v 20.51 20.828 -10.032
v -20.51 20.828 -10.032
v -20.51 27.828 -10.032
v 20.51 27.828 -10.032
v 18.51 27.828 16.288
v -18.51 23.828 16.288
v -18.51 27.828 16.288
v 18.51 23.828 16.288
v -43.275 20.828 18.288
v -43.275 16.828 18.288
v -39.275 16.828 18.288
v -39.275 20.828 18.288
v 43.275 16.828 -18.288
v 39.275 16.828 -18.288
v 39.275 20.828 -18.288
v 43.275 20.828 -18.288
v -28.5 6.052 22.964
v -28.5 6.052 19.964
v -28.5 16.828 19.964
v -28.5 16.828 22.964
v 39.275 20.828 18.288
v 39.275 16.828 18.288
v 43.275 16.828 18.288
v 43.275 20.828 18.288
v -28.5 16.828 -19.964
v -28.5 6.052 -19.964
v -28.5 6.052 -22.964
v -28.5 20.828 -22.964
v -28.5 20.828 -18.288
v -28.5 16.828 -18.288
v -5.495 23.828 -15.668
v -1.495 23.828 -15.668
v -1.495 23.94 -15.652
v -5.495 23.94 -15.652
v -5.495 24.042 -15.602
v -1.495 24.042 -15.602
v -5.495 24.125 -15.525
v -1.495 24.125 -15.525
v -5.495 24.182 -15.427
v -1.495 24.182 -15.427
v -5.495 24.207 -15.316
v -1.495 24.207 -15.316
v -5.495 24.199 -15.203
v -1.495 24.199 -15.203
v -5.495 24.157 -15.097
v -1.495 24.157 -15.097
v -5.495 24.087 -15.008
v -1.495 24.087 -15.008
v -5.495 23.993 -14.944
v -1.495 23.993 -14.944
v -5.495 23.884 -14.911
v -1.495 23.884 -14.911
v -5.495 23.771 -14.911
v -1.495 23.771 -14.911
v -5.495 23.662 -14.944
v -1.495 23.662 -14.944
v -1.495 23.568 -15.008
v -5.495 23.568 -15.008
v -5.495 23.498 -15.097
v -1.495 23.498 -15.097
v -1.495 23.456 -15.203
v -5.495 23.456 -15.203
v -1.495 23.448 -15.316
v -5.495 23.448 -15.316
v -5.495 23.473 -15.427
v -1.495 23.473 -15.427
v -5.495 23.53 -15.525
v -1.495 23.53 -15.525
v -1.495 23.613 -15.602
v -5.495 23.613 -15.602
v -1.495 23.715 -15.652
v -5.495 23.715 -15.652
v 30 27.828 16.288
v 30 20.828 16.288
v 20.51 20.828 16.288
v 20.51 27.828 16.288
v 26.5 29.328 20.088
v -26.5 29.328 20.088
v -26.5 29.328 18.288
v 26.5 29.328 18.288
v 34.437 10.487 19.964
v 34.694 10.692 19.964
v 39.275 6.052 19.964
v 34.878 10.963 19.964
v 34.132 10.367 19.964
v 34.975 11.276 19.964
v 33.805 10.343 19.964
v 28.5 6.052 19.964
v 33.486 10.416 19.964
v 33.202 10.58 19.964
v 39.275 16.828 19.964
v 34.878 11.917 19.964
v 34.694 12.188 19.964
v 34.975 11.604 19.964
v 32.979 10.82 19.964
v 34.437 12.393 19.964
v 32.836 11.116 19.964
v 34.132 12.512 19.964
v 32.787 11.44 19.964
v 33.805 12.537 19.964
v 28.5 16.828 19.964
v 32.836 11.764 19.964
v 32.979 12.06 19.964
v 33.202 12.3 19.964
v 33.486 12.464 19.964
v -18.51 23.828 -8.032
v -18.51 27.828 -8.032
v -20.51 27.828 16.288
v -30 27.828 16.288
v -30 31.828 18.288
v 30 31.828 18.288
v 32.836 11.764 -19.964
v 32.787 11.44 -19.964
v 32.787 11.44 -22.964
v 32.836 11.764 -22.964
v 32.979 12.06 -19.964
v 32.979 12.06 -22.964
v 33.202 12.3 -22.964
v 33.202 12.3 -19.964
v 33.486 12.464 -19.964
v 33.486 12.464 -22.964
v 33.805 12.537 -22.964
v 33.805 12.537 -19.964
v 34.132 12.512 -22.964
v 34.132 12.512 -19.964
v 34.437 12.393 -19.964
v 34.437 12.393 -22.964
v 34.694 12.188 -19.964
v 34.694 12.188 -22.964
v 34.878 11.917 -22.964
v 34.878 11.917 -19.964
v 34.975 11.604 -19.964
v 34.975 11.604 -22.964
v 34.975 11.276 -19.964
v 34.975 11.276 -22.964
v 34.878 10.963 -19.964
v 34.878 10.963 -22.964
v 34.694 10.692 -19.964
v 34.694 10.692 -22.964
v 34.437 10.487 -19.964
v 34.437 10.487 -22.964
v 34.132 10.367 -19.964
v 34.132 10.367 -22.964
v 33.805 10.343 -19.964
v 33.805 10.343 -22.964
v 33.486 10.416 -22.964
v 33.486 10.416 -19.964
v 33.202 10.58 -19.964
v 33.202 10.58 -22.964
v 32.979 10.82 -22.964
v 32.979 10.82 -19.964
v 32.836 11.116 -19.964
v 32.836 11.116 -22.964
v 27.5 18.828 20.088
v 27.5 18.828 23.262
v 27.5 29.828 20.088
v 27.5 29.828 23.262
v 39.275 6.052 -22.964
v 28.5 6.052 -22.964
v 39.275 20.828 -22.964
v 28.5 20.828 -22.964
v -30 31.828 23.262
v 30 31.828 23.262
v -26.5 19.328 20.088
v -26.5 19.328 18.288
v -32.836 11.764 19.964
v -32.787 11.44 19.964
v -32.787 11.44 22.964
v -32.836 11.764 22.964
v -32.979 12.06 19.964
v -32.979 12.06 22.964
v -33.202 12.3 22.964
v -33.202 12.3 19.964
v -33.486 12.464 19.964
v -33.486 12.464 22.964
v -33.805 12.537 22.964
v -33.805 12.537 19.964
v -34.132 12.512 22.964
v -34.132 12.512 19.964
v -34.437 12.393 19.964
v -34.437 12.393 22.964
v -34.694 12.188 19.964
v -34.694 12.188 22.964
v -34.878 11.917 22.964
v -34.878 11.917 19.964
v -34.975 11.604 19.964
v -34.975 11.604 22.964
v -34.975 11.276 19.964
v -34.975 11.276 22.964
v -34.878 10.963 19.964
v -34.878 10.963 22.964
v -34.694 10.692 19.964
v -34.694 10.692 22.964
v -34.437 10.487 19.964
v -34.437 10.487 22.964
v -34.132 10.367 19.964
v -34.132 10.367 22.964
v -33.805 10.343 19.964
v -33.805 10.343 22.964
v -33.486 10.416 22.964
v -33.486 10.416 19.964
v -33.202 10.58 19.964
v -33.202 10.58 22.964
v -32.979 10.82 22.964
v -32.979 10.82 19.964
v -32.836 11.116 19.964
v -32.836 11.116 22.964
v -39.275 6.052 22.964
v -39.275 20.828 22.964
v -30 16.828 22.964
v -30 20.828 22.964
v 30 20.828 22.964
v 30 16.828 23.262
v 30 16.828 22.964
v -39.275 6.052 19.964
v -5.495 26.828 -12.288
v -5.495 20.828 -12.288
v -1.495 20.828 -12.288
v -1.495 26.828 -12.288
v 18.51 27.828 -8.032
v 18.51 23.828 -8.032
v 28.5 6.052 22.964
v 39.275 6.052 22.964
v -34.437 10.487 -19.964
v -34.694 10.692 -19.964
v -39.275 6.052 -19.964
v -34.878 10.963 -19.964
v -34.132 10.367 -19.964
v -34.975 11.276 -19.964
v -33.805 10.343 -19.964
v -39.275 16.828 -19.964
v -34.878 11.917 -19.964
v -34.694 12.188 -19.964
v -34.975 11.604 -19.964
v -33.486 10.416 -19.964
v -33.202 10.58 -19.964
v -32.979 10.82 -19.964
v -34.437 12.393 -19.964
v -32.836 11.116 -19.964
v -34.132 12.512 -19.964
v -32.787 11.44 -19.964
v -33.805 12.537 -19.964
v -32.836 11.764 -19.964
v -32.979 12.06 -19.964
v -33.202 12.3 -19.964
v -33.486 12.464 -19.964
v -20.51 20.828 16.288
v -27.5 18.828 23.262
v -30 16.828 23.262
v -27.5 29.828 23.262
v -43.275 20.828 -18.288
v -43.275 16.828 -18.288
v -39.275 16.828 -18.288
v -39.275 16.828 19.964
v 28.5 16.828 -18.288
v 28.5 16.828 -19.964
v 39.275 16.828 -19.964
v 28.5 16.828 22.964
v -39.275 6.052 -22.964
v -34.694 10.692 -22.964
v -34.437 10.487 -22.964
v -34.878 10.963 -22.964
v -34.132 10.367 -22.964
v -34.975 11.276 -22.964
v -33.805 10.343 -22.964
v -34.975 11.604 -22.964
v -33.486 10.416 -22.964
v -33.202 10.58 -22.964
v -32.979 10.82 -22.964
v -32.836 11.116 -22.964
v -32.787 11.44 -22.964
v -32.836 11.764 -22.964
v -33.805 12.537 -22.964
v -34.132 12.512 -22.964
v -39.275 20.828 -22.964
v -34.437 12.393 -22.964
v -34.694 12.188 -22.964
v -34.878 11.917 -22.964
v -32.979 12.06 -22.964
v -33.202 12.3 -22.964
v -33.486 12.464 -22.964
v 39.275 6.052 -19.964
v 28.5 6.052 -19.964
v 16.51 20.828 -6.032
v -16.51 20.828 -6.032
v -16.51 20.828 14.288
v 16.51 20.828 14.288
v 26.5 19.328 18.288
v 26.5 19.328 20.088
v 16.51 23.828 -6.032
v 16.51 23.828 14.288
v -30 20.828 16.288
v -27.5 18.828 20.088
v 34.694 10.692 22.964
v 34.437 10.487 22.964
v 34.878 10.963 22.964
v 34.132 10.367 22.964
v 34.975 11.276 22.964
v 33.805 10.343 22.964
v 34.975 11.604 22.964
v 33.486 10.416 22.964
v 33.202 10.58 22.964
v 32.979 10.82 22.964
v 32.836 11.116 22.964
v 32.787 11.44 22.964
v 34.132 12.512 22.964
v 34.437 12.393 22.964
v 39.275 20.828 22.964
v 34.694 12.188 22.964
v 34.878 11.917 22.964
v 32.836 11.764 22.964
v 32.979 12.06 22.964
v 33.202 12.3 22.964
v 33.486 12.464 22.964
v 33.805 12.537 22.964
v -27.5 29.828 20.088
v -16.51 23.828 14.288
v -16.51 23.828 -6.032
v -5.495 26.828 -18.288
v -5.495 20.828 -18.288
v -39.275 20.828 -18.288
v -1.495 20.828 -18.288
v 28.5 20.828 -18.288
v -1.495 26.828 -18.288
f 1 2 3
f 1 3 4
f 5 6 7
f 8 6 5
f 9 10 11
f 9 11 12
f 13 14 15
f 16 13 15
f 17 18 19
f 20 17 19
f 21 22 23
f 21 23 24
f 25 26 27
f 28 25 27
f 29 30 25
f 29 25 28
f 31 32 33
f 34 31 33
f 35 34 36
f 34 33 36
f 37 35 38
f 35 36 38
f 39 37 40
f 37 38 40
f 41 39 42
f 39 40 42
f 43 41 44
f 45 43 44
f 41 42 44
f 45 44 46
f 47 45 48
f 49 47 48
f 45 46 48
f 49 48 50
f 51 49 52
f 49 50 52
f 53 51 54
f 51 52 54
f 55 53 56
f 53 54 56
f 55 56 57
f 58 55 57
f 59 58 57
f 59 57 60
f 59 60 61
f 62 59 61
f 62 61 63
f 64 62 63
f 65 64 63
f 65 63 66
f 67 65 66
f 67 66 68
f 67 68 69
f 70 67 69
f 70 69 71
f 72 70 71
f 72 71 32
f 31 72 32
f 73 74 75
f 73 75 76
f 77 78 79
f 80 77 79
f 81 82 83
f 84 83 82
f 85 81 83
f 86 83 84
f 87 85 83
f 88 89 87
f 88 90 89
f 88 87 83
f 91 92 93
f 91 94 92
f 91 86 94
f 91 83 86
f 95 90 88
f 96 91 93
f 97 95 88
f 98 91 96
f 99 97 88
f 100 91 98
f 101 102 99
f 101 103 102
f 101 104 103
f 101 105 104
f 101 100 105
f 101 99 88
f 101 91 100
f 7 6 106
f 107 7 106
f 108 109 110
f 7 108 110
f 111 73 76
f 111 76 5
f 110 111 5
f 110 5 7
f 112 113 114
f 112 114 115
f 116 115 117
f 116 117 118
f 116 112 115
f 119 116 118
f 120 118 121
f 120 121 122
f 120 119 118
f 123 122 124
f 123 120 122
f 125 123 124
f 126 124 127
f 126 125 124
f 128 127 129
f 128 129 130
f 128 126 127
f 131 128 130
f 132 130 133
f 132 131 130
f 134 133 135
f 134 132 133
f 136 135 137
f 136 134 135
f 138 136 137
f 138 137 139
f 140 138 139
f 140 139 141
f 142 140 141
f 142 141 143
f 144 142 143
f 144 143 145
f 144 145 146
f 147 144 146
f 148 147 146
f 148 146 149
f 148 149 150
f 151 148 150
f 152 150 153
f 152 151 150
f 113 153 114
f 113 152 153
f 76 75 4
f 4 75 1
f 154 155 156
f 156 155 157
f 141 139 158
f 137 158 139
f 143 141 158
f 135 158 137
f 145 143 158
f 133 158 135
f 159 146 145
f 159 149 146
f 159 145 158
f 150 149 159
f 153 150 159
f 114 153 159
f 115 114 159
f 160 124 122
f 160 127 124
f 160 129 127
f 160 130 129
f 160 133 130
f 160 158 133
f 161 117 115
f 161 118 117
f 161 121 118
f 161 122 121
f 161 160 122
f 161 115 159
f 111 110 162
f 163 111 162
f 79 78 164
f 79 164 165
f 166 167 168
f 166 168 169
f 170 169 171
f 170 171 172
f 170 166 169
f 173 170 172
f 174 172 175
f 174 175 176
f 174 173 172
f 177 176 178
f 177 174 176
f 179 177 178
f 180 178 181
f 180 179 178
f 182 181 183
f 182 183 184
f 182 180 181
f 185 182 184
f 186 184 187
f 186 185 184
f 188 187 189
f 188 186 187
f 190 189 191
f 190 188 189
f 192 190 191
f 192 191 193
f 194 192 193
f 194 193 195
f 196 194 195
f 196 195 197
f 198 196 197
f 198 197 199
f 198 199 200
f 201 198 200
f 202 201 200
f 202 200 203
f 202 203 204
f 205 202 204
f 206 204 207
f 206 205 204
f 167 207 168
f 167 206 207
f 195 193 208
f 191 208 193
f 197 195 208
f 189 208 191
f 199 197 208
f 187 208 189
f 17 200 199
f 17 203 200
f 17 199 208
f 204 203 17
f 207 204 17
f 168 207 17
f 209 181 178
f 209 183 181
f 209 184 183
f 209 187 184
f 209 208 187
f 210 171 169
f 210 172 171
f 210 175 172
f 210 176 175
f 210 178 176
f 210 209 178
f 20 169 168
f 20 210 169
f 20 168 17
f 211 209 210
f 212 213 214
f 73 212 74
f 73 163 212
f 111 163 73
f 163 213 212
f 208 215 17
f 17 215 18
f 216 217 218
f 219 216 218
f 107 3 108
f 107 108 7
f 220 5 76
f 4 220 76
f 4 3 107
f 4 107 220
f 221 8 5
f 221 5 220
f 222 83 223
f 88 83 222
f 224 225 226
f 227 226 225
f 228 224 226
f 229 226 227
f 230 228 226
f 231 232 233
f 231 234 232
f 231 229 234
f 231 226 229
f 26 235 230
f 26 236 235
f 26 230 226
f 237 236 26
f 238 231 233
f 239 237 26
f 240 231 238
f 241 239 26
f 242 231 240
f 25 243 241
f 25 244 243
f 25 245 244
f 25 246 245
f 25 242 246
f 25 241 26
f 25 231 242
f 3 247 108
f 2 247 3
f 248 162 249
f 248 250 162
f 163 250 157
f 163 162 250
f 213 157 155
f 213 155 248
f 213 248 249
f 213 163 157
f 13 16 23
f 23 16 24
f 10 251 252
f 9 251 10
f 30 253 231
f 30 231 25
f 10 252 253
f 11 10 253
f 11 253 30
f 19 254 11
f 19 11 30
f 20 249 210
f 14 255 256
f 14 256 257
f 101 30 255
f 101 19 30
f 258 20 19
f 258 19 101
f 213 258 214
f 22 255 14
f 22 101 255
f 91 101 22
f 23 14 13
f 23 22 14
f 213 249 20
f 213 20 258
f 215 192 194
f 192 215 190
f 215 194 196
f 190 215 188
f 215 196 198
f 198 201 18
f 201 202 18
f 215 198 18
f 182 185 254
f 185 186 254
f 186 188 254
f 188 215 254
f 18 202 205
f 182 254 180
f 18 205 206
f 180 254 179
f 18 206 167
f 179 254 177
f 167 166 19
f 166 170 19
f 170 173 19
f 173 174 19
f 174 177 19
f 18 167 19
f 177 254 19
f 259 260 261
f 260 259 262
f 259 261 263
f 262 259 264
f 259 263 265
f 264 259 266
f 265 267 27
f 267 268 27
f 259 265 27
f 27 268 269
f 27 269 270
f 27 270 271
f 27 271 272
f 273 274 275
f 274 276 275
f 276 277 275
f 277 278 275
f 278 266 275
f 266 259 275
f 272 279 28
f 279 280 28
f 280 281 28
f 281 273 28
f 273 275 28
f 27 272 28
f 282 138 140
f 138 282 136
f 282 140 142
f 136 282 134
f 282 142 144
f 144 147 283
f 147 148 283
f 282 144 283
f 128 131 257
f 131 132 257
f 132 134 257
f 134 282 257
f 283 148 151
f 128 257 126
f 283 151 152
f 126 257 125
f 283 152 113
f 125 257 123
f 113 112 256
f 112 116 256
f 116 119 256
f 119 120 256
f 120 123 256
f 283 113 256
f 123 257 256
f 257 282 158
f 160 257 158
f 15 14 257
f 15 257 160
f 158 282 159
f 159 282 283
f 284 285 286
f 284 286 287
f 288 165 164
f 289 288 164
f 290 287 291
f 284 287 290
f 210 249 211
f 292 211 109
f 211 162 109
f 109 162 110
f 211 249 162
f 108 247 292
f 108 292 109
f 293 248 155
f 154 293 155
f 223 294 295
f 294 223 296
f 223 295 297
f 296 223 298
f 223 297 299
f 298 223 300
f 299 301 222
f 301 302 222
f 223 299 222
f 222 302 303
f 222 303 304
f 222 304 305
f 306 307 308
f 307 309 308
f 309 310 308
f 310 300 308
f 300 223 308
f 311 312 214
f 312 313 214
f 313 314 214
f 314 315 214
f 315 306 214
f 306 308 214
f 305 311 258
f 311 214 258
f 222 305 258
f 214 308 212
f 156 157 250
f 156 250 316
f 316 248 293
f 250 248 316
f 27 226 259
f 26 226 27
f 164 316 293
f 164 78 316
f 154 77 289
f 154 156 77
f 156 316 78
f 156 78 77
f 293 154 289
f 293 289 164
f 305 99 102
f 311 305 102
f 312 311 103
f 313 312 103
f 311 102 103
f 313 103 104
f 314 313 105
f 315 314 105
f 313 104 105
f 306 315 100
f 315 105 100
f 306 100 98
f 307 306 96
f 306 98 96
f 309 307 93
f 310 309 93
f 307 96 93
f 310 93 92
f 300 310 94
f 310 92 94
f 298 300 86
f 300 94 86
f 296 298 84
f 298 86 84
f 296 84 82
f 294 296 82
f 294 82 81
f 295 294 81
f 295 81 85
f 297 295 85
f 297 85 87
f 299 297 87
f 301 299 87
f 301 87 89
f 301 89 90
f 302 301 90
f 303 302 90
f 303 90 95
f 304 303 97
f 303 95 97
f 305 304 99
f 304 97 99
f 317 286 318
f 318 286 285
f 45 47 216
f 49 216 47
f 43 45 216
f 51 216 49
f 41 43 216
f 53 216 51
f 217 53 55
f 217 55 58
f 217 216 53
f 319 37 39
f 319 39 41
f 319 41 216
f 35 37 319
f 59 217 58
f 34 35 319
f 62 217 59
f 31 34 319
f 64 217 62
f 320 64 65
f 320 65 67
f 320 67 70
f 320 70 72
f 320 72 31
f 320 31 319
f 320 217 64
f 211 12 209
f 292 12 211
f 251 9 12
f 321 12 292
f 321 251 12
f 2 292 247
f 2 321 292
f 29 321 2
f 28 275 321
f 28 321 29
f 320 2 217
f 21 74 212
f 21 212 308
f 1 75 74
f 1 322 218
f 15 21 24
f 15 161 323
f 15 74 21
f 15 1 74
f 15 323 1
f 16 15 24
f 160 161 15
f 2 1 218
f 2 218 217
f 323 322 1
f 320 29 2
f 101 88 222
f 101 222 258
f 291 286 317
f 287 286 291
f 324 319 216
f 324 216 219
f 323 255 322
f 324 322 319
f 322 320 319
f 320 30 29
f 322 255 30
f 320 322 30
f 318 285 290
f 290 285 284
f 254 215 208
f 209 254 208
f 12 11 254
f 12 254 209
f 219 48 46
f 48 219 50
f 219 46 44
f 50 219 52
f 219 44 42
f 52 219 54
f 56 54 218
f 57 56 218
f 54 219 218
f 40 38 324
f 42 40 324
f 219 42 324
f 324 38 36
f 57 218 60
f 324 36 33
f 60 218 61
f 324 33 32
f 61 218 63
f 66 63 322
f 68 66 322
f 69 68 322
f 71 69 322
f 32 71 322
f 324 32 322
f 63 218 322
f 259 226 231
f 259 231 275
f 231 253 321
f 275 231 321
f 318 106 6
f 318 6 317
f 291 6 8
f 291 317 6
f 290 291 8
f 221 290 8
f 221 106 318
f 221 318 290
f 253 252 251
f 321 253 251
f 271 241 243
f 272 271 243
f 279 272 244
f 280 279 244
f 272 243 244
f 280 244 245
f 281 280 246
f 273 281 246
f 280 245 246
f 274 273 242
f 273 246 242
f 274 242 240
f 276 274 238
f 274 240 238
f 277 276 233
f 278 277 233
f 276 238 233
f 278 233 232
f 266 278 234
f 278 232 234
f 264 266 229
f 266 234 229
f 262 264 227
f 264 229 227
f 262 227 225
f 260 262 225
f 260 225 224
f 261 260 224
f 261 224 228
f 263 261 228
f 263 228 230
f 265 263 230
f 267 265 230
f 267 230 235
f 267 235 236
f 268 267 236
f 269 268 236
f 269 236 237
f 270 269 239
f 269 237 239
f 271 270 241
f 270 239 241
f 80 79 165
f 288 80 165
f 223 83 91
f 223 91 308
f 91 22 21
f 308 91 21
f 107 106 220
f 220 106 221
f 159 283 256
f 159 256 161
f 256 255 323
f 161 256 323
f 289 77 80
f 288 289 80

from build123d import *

# Parameters (mm, degrees)
SKETCH1_W               = 36.575
SKETCH1_H               = 41.655
SKETCH1_W_2             = 28.575
SKETCH1_H_2             = 33.655
BOSS_EXTRUDE1_DEPTH     = 41.275
SKETCH2_W               = 36.575
SKETCH2_H               = 41.655
BOSS_EXTRUDE2_DEPTH     = 2
SKETCH4_W               = 86.55
SKETCH4_H               = 36.575
CUT_EXTRUDE2_DEPTH      = 37.655
SKETCH5_W               = 10.7752
SKETCH5_H               = 4
BOSS_EXTRUDE3_DEPTH     = 1.6764
SKETCH6_W               = 10.7752
SKETCH6_H               = 14.7752
SKETCH6_R               = 1.1
BOSS_EXTRUDE4_DEPTH     = 3
MIRROR3_COPY_1_SKETCH_W = 10.7752
MIRROR3_COPY_1_SKETCH_H = 4
MIRROR3_COPY_1_DEPTH    = 1.6764
MIRROR3_COPY_2_SKETCH_W = 10.7752
MIRROR3_COPY_2_SKETCH_H = 14.7752
MIRROR3_COPY_2_SKETCH_R = 1.1
MIRROR3_COPY_2_DEPTH    = 3
SKETCH7_W               = 4
SKETCH7_H               = 6
BOSS_EXTRUDE5_DEPTH     = 6
SKETCH8_R               = 0.381
CUT_EXTRUDE3_DEPTH      = 58.021122047
SKETCH9_W               = 41.02
SKETCH9_H               = 28.32
SKETCH9_W_2             = 33.02
SKETCH9_H_2             = 20.32
BOSS_EXTRUDE6_DEPTH     = 3
SKETCH10_W              = 41.02
SKETCH10_H              = 28.32
SKETCH10_W_2            = 37.02
SKETCH10_H_2            = 24.32
BOSS_EXTRUDE7_DEPTH     = 4
BOSS_EXTRUDE8_DEPTH     = 30
BOSS_EXTRUDE9_DEPTH     = 3.5
SKETCH13_W              = 55
SKETCH13_H              = 11
CUT_EXTRUDE4_DEPTH      = 3.175


with BuildPart() as part:
    # Sketch1 → Boss-Extrude1 (new, symmetric)
    with BuildSketch(Plane(origin=(0, 0, 0), x_dir=(0, 0, -1), z_dir=(1, 0, 0))):
        Rectangle(SKETCH1_W, SKETCH1_H)
        Rectangle(SKETCH1_W_2, SKETCH1_H_2, mode=Mode.SUBTRACT)
    extrude(amount=BOSS_EXTRUDE1_DEPTH, both=True)

    # Sketch2 → Boss-Extrude2 (add)
    with BuildSketch(Plane.ZY.offset(41.275)):
        Rectangle(SKETCH2_W, SKETCH2_H)
    boss_extrude2 = extrude(amount=BOSS_EXTRUDE2_DEPTH)

    # Mirror1: Boss-Extrude2 across plane
    add(boss_extrude2.mirror(Plane(origin=(0, 0, 0), x_dir=(0, 0, 1), z_dir=(1, 0, 0))))

    # Sketch4 → Cut-Extrude2 (cut)
    with BuildSketch(Plane.XZ.offset(20.8275)):
        Rectangle(SKETCH4_W, SKETCH4_H)
    extrude(amount=-CUT_EXTRUDE2_DEPTH, mode=Mode.SUBTRACT)

    # Sketch5 → Boss-Extrude3 (add)
    with BuildSketch(Plane(origin=(0, 0, -18.2875), x_dir=(-1, 0, 0), z_dir=(0, 0, -1))):
        with Locations((-33.8874, 18.8275)):
            Rectangle(SKETCH5_W, SKETCH5_H)
    boss_extrude3 = extrude(amount=BOSS_EXTRUDE3_DEPTH)

    # Sketch6 → Boss-Extrude4 (add)
    with BuildSketch(Plane(origin=(0, 0, -19.9639), x_dir=(-1, 0, 0), z_dir=(0, 0, -1))):
        with Locations((-33.8874, 13.4399)):
            Rectangle(SKETCH6_W, SKETCH6_H)
        with Locations((-33.8874, 11.4399)):
            Circle(SKETCH6_R, mode=Mode.SUBTRACT)
    boss_extrude4 = extrude(amount=BOSS_EXTRUDE4_DEPTH)

    # Mirror2: Boss-Extrude3, Boss-Extrude4 across plane
    add(boss_extrude3.mirror(Plane(origin=(0, 0, 0), x_dir=(0, 0, 1), z_dir=(1, 0, 0))))
    add(boss_extrude4.mirror(Plane(origin=(0, 0, 0), x_dir=(0, 0, 1), z_dir=(1, 0, 0))))

    # Mirror3: Boss-Extrude3, Boss-Extrude4 across plane
    add(boss_extrude3.mirror(Plane.XY))
    add(boss_extrude4.mirror(Plane.XY))

    # Mirror3 copy 1 sketch → Mirror3 copy 1 (add)
    with BuildSketch(Plane.XY.offset(18.2875)):
        with Locations((-33.8874, 18.8275)):
            Rectangle(MIRROR3_COPY_1_SKETCH_W, MIRROR3_COPY_1_SKETCH_H)
    extrude(amount=MIRROR3_COPY_1_DEPTH)

    # Mirror3 copy 2 sketch → Mirror3 copy 2 (add)
    with BuildSketch(Plane.XY.offset(19.9639)):
        with Locations((-33.8874, 13.4399)):
            Rectangle(MIRROR3_COPY_2_SKETCH_W, MIRROR3_COPY_2_SKETCH_H)
        with Locations((-33.8874, 11.4399)):
            Circle(MIRROR3_COPY_2_SKETCH_R, mode=Mode.SUBTRACT)
    extrude(amount=MIRROR3_COPY_2_DEPTH)

    # Sketch7 → Boss-Extrude5 (add)
    with BuildSketch(Plane(origin=(0, 20.8275, 0), x_dir=(1, 0, 0), z_dir=(0, 1, 0))):
        with Locations((-3.495, 15.2875)):
            Rectangle(SKETCH7_W, SKETCH7_H)
    extrude(amount=BOSS_EXTRUDE5_DEPTH)

    # Sketch8 → Cut-Extrude3 (cut, through all)
    with BuildSketch(Plane(origin=(-1.495, 0, 0), x_dir=(0, 0, -1), z_dir=(1, 0, 0))):
        with Locations((15.2875, 23.8275)):
            Circle(SKETCH8_R)
    extrude(amount=-CUT_EXTRUDE3_DEPTH, mode=Mode.SUBTRACT)

    # Sketch9 → Boss-Extrude6 (add)
    with BuildSketch(Plane(origin=(0, 20.8275, 0), x_dir=(1, 0, 0), z_dir=(0, 1, 0))):
        with Locations((0, -4.1275)):
            Rectangle(SKETCH9_W, SKETCH9_H)
        with Locations((0, -4.1275)):
            Rectangle(SKETCH9_W_2, SKETCH9_H_2, mode=Mode.SUBTRACT)
    extrude(amount=BOSS_EXTRUDE6_DEPTH)

    # Sketch10 → Boss-Extrude7 (add)
    with BuildSketch(Plane(origin=(0, 23.8275, 0), x_dir=(1, 0, 0), z_dir=(0, 1, 0))):
        with Locations((0, -4.1275)):
            Rectangle(SKETCH10_W, SKETCH10_H)
        with Locations((0, -4.1275)):
            Rectangle(SKETCH10_W_2, SKETCH10_H_2, mode=Mode.SUBTRACT)
    extrude(amount=BOSS_EXTRUDE7_DEPTH)

    # Sketch11 → Boss-Extrude8 (add, symmetric)
    with BuildSketch(Plane(origin=(0, 0, 0), x_dir=(0, 0, -1), z_dir=(1, 0, 0))):
        Polygon((-18.2875, 31.8275), (-23.2625, 31.8275), (-23.2625, 29.8275), (-20.0875, 29.8275), (-20.0875, 29.3275), (-18.2875, 29.3275), (-18.2875, 19.3275), (-20.0875, 19.3275), (-20.0875, 18.8275), (-23.2625, 18.8275), (-23.2625, 16.8275), (-18.2875, 16.8275), (-16.2875, 16.8275), (-16.2875, 27.8275), align=None)
    extrude(amount=BOSS_EXTRUDE8_DEPTH, both=True)

    # Sketch12 → Boss-Extrude9 (add)
    with BuildSketch(Plane.ZY.offset(30)):
        Polygon((23.2625, 29.8275), (23.2625, 18.8275), (18.2875, 18.8275), (18.2875, 29.3275), (20.0875, 29.3275), (20.0875, 29.8275), align=None)
    boss_extrude9 = extrude(amount=-BOSS_EXTRUDE9_DEPTH)

    # Mirror4: Boss-Extrude9 across plane
    add(boss_extrude9.mirror(Plane(origin=(0, 0, 0), x_dir=(0, 0, 1), z_dir=(1, 0, 0))))

    # Sketch13 → Cut-Extrude4 (cut)
    with BuildSketch(Plane.XY.offset(23.2625)):
        with Locations((0, 24.3275)):
            Rectangle(SKETCH13_W, SKETCH13_H)
    extrude(amount=-CUT_EXTRUDE4_DEPTH, mode=Mode.SUBTRACT)


solid = part.part
